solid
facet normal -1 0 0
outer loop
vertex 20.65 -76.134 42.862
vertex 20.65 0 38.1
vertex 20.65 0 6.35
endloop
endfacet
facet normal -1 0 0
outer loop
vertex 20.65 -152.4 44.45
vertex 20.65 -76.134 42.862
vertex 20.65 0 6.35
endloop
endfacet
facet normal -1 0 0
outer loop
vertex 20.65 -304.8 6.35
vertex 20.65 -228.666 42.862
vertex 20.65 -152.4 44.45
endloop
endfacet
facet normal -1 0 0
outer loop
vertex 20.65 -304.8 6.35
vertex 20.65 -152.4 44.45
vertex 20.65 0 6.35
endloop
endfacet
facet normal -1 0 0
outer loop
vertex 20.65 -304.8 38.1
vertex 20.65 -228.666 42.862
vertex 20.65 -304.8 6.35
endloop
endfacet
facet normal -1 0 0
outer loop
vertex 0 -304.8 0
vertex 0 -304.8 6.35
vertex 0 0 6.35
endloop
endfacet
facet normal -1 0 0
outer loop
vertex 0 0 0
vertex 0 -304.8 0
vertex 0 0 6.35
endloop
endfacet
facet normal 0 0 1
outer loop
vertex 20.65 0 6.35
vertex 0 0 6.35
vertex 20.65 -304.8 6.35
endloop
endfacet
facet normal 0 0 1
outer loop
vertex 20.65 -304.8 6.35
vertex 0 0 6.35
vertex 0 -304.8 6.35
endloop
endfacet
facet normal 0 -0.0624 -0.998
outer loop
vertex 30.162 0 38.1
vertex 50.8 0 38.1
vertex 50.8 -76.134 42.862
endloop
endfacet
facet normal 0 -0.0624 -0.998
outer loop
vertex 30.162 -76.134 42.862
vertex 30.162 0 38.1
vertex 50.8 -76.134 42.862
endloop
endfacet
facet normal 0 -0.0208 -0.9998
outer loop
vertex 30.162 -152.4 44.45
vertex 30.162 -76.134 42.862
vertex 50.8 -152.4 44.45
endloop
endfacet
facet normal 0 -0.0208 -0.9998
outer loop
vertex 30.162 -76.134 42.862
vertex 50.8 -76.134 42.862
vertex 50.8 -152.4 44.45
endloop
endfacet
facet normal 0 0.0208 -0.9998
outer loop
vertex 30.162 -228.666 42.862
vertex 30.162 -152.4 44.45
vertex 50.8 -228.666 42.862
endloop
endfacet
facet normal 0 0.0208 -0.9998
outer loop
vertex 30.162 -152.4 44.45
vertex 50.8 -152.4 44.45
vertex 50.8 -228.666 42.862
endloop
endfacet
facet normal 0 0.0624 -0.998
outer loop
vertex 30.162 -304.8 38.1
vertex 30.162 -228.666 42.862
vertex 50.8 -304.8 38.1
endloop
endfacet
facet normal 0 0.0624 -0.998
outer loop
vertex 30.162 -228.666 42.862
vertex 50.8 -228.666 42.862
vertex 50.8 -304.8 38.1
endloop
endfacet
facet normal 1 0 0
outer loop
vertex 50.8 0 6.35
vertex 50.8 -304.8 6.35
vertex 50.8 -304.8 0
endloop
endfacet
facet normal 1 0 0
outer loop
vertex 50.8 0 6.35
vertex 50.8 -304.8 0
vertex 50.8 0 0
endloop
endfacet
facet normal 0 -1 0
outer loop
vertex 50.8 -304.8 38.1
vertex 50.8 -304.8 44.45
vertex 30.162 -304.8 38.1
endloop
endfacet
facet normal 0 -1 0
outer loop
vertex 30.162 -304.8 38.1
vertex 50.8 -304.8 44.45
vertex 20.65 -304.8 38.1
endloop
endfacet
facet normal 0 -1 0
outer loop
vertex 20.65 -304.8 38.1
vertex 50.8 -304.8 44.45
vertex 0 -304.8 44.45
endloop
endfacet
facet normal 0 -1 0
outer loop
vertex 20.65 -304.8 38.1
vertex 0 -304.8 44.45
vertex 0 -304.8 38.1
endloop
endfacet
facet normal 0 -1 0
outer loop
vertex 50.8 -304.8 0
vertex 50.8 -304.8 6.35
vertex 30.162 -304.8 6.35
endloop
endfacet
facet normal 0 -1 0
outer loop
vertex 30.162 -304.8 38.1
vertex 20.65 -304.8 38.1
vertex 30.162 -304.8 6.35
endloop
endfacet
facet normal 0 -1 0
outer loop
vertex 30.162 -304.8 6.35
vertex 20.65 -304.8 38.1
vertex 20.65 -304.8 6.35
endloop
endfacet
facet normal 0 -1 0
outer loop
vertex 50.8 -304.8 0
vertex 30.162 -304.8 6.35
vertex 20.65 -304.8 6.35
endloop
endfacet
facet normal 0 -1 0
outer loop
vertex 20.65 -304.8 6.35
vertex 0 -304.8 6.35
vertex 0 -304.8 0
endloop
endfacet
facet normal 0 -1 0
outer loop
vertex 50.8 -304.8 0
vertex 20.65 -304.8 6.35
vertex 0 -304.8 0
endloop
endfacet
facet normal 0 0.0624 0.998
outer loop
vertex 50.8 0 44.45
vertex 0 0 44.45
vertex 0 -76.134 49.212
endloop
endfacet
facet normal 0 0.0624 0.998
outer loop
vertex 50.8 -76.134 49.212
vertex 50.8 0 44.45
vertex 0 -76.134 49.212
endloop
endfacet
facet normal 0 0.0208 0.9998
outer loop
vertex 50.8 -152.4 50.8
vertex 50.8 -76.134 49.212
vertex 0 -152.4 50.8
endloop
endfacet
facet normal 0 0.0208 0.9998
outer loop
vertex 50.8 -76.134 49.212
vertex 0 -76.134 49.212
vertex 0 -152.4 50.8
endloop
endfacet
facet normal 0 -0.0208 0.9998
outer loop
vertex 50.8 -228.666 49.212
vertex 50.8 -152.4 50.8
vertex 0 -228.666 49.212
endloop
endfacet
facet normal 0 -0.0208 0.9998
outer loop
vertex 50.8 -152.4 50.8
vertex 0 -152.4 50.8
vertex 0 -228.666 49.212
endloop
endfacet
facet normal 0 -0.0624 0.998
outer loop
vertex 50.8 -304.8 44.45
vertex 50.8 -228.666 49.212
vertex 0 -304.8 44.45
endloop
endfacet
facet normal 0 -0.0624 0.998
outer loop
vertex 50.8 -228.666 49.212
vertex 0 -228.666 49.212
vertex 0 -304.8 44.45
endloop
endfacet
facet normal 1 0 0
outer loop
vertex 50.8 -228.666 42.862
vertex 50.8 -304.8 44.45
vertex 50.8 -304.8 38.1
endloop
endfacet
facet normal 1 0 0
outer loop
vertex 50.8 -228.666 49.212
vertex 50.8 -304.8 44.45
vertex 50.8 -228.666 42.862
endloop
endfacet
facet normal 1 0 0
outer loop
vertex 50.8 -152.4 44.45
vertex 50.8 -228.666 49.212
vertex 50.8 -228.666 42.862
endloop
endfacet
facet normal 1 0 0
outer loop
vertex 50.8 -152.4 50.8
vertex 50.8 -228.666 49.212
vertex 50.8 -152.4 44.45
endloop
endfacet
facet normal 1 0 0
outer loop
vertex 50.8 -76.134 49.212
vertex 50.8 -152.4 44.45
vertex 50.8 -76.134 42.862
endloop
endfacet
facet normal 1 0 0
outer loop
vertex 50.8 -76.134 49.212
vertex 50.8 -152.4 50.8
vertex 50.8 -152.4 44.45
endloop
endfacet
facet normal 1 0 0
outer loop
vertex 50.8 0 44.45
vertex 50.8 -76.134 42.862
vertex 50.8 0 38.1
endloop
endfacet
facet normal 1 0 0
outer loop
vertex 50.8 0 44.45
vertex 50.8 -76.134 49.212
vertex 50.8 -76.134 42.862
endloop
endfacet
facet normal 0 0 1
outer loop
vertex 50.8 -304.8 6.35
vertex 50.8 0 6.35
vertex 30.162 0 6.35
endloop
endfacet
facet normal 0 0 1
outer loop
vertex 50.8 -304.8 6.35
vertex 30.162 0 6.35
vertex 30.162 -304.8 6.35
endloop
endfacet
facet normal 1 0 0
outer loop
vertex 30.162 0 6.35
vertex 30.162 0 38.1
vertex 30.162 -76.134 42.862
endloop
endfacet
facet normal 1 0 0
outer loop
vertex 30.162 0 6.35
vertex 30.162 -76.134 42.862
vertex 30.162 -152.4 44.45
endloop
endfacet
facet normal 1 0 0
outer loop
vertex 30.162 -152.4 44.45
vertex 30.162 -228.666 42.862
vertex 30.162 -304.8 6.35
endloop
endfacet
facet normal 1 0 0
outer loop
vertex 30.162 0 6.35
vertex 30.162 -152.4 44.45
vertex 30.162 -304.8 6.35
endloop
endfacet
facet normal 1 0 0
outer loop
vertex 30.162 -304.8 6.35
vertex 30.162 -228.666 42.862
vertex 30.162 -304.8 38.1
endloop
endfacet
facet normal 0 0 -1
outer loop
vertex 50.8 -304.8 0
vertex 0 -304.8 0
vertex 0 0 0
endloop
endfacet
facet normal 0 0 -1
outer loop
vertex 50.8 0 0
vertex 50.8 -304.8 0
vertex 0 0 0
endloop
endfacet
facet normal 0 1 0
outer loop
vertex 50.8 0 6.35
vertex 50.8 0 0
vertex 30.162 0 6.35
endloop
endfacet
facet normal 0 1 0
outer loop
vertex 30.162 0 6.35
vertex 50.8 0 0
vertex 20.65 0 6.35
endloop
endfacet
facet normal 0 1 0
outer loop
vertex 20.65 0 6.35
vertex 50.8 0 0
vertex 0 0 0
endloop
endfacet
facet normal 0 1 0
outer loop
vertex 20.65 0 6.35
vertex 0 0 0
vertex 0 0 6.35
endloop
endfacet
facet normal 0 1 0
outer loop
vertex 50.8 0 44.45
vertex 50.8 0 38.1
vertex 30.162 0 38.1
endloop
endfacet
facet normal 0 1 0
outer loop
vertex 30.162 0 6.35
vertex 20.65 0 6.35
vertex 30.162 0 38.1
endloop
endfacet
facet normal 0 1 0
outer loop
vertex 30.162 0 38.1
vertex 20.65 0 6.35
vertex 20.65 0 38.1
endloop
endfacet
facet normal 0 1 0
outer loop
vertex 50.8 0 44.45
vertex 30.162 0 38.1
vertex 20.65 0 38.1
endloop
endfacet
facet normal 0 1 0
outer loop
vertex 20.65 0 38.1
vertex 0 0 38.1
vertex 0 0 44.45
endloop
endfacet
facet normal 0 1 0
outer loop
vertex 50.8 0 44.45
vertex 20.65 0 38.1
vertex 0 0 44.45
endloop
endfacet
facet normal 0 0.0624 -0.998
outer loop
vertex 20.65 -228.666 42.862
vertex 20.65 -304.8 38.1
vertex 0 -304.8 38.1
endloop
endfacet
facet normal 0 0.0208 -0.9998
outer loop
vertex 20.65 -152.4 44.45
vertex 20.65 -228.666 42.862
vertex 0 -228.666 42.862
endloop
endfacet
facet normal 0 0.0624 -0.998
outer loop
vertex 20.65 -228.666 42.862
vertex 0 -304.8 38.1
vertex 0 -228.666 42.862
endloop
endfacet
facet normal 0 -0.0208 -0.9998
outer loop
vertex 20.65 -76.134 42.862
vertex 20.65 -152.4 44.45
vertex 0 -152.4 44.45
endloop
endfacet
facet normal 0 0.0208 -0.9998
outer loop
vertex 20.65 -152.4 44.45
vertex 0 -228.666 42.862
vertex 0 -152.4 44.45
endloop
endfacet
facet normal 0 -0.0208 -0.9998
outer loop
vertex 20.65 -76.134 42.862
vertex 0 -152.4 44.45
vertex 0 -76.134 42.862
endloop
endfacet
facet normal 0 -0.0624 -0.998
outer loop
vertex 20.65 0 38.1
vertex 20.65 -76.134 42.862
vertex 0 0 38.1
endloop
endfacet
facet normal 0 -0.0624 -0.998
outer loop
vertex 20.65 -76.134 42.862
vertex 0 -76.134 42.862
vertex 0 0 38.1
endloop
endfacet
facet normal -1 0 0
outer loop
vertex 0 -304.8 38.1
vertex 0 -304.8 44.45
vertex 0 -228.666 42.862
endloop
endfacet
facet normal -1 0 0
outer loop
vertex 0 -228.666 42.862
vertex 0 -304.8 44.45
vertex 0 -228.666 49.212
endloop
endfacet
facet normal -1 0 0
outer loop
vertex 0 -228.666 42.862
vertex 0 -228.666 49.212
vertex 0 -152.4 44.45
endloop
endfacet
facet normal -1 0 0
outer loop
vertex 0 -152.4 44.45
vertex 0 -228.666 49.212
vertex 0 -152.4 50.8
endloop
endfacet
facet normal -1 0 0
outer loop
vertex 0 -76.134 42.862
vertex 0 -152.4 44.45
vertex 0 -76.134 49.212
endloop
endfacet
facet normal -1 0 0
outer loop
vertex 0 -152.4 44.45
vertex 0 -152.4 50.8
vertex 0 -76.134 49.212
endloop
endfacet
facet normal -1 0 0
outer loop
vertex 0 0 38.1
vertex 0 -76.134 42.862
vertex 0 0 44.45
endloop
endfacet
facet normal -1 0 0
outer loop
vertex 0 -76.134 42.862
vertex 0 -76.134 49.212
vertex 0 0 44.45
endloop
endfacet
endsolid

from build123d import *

# Parameters (mm, degrees)
F0_W     = 304.8
F0_H     = 6.35
F1_DEPTH = 50.8
F3_DEPTH = 0.8125
F5_DEPTH = 20.6502


# Not quite as in the source:
# - a pattern or mirror of a feature is missing from the dataset's text; its kind, count and spacing are read off the source's solid


with BuildPart() as f1:
    # F0 (on Right) → F1 (new body)
    with BuildSketch(Plane.YZ):
        with BuildLine():
            Line((-304.8, 6.35), (0, 6.35))
            Line((0, 6.35), (0, 38.1))
            ThreePointArc((0, 38.1), (-152.4, 44.45), (-304.8, 38.1))
            Line((-304.8, 38.1), (-304.8, 6.35))
        make_face()
        with BuildLine():
            ThreePointArc((-304.8, 38.1), (-152.4, 44.45), (0, 38.1))
            Line((0, 38.1), (0, 44.45))
            ThreePointArc((0, 44.45), (-152.4, 50.8), (-304.8, 44.45))
            Line((-304.8, 44.45), (-304.8, 38.1))
        make_face()
        with Locations((-152.4, 3.175)):
            Rectangle(F0_W, F0_H)
    extrude(amount=F1_DEPTH)

    # F2 (on face) → F3 (cut)
    with BuildSketch(Plane.YZ.offset(50.8)):
        with BuildLine():
            Line((0, 6.35), (0, 38.1))
            ThreePointArc((0, 38.1), (-152.4, 44.45), (-304.8, 38.1))
            Line((-304.8, 38.1), (-304.8, 6.35))
            Line((-304.8, 6.35), (0, 6.35))
        make_face()
    extrude(amount=-F3_DEPTH, mode=Mode.SUBTRACT)

    # F4 (on face) → F5 (cut)
    with BuildSketch(Plane(origin=(0, 0, 0), x_dir=(0, -1, 0), z_dir=(-1, 0, 0))):
        with BuildLine():
            Line((304.8, 6.35), (304.8, 38.1))
            ThreePointArc((304.8, 38.1), (152.4, 44.45), (0, 38.1))
            Line((0, 38.1), (0, 6.35))
            Line((0, 6.35), (304.8, 6.35))
        make_face()
    f5 = extrude(amount=-F5_DEPTH, mode=Mode.SUBTRACT)

    # F5_copies: F5 across plane
    add(f5.mirror(Plane(origin=(25.40635, 0, 0), x_dir=(0, 0, 1), z_dir=(1, 0, 0))), mode=Mode.SUBTRACT)


solid = f1.part
